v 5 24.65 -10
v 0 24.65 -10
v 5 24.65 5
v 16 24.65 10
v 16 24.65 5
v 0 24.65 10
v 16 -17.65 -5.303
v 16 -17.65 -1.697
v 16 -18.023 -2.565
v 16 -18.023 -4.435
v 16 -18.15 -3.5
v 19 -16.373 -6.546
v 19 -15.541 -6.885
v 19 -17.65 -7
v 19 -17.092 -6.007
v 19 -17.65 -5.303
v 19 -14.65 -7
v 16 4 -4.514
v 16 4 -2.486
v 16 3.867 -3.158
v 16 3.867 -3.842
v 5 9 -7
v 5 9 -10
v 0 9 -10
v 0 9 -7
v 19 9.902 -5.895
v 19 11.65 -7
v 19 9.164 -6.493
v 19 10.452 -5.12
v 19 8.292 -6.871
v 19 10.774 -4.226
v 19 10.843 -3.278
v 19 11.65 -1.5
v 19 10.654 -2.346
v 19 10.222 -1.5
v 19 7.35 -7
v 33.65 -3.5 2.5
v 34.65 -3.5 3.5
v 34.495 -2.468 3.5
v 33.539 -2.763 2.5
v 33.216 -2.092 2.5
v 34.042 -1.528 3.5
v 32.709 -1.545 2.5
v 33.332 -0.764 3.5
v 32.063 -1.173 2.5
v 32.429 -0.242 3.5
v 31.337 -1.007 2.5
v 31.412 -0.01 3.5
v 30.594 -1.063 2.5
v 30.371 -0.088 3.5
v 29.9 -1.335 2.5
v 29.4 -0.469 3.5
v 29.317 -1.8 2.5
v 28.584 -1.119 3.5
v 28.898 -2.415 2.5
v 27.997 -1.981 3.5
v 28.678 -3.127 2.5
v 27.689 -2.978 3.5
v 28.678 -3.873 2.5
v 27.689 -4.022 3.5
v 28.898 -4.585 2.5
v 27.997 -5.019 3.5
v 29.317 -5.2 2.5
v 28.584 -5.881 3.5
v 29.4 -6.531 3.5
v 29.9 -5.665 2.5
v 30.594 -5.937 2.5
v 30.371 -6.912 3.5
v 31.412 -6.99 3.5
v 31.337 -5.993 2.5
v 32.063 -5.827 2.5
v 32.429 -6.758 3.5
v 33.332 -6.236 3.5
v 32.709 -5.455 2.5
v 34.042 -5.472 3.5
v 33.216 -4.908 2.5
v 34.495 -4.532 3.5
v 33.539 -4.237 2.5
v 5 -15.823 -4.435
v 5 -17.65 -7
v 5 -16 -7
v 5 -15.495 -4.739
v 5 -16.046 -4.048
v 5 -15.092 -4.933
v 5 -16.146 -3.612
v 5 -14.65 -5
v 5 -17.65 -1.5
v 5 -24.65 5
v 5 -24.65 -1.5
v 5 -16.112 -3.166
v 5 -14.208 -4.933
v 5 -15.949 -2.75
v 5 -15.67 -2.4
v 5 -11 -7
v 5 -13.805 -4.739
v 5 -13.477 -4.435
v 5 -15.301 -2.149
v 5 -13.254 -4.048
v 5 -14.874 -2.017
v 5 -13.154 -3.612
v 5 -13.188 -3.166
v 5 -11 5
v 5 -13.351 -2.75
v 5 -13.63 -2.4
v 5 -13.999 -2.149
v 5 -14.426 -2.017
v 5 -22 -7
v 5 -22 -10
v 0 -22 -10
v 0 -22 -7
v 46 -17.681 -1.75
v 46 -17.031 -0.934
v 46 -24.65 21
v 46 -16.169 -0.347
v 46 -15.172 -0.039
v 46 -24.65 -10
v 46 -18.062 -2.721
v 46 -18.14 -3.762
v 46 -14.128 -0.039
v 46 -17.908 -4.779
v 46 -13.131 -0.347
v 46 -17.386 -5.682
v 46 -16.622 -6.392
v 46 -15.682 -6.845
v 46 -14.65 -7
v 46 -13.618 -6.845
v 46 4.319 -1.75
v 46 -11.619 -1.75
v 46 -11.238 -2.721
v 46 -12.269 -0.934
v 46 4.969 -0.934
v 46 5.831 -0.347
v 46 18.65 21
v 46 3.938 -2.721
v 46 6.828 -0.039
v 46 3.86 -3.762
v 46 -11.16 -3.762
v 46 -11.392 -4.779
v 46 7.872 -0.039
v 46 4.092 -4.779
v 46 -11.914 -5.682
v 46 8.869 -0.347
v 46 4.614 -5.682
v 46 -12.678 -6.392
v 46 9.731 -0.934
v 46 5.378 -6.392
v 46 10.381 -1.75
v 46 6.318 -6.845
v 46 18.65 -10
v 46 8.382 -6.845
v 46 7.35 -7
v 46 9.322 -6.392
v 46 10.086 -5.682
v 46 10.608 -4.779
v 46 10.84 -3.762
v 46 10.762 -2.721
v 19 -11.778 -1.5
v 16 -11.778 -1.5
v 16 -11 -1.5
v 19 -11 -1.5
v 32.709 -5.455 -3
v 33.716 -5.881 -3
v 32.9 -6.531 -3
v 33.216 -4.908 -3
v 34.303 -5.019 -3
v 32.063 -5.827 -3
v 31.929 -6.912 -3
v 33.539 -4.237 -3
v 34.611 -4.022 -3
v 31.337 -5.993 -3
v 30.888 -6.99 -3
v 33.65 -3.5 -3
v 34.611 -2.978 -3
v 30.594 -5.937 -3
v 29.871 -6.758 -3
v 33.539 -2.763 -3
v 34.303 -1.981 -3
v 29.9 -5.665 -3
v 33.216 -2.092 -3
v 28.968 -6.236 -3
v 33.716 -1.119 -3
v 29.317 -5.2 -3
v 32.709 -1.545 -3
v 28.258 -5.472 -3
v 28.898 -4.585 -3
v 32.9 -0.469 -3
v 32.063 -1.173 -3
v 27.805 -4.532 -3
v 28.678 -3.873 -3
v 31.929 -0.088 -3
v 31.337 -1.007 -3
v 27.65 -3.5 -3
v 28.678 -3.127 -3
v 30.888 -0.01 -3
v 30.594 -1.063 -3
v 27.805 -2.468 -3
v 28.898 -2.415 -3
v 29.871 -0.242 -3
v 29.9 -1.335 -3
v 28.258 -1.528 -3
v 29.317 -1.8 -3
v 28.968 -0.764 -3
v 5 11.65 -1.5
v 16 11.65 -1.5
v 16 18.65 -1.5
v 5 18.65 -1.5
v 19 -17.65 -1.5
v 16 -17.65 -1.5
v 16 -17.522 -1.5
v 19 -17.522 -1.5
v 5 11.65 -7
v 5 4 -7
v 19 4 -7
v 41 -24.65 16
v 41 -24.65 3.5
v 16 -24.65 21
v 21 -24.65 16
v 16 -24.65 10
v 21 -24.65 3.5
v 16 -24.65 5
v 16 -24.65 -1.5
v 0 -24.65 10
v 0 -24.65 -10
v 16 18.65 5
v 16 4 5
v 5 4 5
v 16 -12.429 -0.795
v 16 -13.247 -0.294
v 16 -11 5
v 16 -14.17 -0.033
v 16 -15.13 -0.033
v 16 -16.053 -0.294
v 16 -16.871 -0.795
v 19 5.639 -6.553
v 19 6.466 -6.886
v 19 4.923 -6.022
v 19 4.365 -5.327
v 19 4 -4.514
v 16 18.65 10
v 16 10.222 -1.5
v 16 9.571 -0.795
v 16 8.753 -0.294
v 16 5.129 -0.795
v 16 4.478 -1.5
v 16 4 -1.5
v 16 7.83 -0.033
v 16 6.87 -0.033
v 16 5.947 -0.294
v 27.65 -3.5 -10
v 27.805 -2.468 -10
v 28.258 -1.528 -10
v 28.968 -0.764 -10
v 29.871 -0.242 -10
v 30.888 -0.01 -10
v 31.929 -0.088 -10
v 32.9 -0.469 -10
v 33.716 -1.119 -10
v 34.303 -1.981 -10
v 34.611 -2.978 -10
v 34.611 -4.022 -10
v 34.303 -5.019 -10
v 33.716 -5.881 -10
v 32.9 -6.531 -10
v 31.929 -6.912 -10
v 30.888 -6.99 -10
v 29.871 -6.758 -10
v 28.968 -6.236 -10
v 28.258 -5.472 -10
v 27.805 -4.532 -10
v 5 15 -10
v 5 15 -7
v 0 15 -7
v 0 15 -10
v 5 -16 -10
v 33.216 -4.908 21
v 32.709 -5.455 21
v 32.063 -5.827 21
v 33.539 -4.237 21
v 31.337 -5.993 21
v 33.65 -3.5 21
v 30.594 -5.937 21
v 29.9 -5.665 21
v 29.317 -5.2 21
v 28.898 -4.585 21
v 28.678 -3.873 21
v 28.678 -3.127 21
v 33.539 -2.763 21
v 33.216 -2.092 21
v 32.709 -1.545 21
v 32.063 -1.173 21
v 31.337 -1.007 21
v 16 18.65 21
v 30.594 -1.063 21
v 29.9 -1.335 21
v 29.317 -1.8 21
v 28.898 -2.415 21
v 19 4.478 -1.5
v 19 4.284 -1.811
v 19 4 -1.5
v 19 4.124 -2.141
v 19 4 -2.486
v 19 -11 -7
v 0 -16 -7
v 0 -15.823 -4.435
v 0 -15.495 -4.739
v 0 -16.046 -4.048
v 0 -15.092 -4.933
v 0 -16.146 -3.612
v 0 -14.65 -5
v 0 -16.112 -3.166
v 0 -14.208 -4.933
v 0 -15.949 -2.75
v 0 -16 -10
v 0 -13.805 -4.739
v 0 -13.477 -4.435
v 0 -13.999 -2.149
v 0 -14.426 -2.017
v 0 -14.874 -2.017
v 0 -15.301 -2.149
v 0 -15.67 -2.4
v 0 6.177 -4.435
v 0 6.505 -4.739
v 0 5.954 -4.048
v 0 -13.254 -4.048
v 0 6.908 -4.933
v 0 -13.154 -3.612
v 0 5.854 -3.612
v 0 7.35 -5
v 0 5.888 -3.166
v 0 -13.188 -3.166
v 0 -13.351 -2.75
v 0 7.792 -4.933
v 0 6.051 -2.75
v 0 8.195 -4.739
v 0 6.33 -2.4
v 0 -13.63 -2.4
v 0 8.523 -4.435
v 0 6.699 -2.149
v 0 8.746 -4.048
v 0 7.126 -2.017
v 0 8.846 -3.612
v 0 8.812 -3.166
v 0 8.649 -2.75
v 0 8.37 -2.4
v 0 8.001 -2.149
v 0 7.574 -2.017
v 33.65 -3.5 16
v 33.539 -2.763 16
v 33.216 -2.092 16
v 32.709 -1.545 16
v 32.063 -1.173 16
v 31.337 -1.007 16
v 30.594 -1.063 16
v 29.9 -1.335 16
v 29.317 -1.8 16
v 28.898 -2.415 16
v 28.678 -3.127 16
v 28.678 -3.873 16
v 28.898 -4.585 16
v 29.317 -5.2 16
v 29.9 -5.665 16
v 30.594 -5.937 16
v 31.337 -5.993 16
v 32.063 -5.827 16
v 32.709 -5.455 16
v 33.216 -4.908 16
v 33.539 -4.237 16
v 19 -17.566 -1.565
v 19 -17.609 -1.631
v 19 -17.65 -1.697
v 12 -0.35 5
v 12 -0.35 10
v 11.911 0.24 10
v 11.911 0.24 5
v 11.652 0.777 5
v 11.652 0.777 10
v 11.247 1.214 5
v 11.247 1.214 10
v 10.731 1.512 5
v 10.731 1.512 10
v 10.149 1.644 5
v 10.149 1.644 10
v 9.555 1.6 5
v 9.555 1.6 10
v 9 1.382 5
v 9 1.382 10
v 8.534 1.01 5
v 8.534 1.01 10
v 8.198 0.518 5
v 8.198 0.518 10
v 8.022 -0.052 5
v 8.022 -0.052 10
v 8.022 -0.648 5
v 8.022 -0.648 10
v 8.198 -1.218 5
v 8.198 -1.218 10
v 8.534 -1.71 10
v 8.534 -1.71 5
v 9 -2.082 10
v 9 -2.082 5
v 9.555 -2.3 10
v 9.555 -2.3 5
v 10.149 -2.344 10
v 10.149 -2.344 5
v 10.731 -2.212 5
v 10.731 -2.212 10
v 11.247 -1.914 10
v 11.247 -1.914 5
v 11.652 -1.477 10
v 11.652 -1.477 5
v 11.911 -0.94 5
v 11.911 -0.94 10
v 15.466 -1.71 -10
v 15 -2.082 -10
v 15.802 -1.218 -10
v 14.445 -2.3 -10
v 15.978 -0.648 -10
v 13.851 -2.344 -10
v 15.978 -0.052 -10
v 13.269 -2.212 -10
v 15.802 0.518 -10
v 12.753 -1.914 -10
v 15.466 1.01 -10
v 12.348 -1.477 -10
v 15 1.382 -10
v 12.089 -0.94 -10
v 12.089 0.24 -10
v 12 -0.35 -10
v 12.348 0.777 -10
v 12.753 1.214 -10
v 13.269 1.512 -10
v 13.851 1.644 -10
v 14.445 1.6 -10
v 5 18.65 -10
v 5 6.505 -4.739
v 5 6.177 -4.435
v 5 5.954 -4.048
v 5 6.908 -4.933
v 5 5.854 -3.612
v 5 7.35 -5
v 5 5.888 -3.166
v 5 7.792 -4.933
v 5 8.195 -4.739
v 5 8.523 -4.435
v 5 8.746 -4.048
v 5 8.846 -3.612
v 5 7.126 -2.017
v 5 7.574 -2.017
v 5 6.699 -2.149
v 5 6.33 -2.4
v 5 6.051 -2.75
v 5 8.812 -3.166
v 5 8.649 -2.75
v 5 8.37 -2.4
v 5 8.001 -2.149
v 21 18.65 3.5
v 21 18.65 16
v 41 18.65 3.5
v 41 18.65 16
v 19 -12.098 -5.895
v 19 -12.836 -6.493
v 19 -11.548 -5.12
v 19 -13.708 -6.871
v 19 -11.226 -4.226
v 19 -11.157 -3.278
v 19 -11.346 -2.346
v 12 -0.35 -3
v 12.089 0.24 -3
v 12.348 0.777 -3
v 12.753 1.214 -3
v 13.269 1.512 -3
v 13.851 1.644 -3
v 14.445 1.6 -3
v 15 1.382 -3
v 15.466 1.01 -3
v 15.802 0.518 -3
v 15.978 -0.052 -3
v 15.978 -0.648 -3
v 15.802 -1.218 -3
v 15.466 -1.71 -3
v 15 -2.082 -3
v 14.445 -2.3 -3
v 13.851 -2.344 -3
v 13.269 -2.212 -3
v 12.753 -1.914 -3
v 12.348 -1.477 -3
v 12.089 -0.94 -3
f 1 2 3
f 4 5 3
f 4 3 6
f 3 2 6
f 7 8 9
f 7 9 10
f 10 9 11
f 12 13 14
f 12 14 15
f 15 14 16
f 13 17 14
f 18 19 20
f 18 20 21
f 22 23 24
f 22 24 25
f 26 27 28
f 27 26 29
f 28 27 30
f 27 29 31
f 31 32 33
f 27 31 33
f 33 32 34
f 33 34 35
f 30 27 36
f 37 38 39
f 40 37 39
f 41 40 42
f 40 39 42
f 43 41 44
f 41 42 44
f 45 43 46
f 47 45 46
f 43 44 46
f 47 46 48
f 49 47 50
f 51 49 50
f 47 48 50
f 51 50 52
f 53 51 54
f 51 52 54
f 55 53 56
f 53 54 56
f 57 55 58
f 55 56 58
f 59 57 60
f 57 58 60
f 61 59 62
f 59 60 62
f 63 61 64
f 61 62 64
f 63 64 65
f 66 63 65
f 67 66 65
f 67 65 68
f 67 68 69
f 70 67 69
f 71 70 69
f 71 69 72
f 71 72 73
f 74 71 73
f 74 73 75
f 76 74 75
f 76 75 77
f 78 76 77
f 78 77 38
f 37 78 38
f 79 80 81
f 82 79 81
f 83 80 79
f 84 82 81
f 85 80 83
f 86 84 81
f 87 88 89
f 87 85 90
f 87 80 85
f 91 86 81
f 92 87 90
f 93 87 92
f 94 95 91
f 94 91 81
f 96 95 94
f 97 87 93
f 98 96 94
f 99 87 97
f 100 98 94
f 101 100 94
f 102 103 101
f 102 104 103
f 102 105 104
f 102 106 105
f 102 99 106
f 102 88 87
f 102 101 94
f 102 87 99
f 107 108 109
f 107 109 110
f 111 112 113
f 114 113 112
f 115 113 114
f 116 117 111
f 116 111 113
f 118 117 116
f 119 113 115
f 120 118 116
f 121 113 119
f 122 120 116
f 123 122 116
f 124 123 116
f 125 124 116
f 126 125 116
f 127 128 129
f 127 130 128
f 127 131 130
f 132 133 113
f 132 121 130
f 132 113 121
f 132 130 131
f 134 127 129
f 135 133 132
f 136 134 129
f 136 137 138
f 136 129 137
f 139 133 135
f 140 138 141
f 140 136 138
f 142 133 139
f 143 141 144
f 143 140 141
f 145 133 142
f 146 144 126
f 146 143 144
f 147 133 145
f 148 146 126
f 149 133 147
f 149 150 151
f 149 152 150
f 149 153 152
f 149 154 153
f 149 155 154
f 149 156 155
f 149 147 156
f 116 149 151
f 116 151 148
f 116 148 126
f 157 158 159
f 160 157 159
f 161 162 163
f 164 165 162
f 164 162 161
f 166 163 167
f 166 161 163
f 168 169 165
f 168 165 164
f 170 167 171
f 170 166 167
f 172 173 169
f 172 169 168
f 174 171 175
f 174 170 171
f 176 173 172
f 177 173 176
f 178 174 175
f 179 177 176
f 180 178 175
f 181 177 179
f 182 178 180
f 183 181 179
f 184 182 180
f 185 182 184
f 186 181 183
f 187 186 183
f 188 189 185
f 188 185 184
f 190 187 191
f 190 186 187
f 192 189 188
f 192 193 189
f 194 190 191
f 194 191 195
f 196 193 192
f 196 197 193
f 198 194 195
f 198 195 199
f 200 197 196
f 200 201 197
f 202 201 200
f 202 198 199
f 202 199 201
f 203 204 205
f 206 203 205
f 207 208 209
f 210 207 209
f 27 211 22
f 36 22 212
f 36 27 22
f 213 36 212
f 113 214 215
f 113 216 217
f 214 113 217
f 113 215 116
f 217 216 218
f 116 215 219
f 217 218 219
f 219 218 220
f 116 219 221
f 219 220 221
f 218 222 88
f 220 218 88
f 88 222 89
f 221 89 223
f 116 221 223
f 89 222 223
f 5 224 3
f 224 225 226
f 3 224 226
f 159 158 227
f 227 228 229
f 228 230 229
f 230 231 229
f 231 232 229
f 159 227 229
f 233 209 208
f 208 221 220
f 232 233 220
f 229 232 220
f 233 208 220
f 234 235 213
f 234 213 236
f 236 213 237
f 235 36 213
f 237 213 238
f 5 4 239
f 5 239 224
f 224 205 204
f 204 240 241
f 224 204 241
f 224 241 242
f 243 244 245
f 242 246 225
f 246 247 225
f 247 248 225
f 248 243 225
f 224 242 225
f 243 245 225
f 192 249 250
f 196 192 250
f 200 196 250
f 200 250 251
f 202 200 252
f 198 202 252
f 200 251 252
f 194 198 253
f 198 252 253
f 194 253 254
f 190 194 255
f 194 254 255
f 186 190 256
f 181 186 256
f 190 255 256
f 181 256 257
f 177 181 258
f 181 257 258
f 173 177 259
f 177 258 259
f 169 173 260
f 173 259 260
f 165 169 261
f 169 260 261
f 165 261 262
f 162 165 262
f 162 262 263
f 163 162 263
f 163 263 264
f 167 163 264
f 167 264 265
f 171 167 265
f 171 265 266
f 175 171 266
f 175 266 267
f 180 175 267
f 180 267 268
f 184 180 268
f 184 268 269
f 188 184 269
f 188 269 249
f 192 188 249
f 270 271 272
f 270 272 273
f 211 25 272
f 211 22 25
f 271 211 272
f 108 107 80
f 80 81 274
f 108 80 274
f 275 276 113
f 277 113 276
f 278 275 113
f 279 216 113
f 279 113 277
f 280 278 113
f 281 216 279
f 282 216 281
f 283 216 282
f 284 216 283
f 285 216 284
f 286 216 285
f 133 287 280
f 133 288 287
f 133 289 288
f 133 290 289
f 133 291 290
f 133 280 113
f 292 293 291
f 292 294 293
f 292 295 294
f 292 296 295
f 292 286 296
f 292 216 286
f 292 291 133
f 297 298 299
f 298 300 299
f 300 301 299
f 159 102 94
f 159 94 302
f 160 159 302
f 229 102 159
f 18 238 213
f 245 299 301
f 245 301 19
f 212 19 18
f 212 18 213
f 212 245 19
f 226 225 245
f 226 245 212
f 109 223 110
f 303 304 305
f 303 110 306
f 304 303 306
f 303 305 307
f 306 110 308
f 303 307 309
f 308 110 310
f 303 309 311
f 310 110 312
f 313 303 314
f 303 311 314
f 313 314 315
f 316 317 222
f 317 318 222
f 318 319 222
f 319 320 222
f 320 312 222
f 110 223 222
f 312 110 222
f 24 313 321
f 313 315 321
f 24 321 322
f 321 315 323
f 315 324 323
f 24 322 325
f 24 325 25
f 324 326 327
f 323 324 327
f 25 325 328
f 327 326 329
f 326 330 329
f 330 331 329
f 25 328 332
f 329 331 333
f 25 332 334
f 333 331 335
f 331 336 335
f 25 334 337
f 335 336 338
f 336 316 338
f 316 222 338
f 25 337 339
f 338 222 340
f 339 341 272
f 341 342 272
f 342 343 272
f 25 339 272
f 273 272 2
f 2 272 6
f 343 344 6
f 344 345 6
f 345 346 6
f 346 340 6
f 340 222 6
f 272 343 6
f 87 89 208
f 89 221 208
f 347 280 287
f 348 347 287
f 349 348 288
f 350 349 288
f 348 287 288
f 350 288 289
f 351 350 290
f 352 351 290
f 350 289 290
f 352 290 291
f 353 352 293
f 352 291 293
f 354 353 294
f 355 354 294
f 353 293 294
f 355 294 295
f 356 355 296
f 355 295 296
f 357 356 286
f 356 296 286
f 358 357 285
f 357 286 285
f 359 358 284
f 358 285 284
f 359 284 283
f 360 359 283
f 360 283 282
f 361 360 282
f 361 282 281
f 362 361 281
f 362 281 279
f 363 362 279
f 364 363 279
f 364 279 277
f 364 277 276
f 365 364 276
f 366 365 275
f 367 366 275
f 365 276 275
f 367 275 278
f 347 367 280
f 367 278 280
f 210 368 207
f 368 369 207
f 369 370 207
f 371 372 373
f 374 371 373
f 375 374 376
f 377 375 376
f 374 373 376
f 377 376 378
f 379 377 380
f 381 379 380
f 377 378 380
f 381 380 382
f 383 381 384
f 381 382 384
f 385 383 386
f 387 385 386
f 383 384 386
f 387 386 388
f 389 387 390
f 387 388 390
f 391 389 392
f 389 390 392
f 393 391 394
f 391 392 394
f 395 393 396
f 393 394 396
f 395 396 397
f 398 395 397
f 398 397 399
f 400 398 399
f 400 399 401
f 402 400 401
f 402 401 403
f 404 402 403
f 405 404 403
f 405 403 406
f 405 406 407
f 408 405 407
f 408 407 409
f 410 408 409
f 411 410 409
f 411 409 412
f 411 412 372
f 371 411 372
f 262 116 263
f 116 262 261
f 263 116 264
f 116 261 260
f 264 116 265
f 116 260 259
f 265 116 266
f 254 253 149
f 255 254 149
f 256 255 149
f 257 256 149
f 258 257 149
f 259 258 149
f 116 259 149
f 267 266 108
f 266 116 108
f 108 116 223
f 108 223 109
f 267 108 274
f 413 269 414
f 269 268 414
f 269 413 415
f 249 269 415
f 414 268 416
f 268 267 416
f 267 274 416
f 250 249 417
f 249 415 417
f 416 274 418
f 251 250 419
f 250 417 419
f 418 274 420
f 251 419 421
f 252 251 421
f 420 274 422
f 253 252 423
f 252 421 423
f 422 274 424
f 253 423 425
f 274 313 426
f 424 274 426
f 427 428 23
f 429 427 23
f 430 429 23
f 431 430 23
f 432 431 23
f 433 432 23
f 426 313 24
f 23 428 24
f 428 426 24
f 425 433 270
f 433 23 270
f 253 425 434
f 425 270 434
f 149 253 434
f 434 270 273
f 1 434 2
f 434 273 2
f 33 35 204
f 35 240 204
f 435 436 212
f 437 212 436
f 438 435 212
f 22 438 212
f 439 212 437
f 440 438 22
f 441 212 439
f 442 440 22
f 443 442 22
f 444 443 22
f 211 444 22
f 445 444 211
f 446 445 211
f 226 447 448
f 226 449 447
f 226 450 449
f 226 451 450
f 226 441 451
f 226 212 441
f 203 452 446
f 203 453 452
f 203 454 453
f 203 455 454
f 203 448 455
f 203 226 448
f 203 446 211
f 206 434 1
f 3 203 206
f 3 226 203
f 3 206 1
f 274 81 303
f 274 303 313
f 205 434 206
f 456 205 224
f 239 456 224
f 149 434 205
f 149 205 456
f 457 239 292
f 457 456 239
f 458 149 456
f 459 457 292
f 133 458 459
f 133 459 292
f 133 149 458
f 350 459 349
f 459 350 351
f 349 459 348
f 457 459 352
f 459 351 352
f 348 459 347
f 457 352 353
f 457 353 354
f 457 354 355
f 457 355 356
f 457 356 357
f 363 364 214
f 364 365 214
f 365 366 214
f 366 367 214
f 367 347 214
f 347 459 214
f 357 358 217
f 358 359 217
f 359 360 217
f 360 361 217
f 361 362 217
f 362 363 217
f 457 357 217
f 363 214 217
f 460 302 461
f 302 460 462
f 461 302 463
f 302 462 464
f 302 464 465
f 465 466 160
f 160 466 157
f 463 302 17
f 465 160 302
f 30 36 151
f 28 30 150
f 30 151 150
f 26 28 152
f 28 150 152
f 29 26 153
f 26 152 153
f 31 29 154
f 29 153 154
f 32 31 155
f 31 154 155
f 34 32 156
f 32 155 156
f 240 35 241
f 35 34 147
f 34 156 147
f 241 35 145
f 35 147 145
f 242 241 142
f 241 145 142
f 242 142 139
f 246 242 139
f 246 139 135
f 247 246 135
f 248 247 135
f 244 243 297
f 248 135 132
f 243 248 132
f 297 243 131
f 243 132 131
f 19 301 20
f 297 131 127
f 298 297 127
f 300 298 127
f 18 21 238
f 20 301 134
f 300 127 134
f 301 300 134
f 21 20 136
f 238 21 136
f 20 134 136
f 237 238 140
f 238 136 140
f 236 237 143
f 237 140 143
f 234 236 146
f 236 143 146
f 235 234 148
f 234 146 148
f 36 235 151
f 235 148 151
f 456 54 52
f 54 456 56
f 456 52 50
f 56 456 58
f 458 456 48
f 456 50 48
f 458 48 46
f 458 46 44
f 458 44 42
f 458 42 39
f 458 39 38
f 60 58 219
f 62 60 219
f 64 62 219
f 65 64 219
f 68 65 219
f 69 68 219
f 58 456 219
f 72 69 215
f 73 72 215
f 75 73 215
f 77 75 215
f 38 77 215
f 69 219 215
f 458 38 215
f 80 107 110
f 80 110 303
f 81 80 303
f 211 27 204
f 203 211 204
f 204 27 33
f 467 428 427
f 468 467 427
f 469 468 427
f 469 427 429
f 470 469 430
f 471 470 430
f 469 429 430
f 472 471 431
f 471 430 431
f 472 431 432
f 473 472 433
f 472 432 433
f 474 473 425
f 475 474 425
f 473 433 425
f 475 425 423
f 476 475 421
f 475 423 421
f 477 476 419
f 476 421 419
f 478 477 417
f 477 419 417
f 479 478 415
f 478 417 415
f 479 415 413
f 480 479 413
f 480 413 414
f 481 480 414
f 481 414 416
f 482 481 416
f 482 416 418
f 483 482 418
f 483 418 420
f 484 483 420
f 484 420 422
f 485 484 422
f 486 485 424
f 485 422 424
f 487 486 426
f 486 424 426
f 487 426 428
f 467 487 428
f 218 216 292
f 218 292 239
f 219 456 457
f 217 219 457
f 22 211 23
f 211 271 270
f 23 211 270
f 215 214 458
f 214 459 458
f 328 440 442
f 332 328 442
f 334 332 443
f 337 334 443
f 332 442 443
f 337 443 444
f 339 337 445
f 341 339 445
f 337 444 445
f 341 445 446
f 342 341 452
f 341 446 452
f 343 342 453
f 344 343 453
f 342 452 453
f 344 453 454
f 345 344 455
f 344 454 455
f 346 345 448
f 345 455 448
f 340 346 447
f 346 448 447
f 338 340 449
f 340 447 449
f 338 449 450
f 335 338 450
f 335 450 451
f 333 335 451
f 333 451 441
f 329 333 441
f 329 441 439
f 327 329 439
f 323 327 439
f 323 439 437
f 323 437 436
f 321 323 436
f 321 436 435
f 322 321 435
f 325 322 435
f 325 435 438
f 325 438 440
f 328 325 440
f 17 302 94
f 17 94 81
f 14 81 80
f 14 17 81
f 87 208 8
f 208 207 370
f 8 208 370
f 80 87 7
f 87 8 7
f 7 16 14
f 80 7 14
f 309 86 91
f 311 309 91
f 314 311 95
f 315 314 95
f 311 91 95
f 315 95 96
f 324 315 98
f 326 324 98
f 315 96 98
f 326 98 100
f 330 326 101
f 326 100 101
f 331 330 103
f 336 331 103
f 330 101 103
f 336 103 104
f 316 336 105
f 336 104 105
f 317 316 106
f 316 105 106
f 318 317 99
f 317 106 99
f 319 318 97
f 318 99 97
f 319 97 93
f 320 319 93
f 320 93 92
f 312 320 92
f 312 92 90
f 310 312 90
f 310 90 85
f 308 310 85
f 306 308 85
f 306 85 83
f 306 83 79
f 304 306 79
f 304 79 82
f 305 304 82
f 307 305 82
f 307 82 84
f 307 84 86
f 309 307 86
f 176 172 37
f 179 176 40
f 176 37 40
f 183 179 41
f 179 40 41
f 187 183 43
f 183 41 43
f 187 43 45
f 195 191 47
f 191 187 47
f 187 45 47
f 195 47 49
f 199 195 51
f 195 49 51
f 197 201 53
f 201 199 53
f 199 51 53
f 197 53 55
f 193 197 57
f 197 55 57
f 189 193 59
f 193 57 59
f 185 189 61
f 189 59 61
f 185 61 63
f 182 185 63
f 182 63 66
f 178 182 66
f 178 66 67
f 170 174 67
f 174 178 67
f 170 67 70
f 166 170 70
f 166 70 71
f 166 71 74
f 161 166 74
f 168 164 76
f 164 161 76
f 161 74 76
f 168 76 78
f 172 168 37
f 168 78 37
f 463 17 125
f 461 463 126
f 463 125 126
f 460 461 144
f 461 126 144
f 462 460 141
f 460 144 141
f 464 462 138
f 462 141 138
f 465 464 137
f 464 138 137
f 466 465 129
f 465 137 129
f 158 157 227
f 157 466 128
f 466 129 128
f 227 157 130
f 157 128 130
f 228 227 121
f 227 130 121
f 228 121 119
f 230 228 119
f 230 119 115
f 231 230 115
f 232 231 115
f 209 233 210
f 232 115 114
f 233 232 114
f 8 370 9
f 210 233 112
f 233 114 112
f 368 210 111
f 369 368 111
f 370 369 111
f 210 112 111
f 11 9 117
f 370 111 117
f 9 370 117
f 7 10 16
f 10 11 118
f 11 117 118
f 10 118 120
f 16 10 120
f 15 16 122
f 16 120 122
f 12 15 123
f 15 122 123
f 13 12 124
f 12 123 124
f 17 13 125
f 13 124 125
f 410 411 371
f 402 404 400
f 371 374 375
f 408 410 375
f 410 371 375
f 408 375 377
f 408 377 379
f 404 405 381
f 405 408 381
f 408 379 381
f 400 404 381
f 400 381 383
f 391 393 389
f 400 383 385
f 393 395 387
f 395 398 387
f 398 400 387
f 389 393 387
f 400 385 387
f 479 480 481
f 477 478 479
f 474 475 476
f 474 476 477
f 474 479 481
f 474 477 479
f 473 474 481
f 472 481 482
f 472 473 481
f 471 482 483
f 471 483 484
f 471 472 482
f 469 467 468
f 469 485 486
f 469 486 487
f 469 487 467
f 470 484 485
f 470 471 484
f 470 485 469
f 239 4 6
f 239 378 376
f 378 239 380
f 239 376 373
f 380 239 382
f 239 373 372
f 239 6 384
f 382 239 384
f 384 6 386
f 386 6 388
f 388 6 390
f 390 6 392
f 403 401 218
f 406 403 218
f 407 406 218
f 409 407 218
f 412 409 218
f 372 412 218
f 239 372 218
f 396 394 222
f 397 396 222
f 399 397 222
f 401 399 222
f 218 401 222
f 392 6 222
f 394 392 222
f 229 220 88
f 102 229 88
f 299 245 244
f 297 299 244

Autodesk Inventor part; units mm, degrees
ref_plane "YZ Plane" through (0, 0, 0) normal (1, 0, 0) x (0, 1, 0)
ref_plane "XZ Plane" through (0, 0, 0) normal (0, 1, 0) x (-1, 0, 0)
ref_plane "XY Plane" through (0, 0, 0) normal (0, 0, 1) x (1, 0, 0)
sketch "Boceto15" plane through (0, 0, 0) normal (1, 0, 0) x (0, 1, 0)
  line L0 (24.65, 10) -> (-24.65, 10)
  line L1 (-24.65, 10) -> (-24.65, -10)
  line L2 (-24.65, -10) -> (24.65, -10)
  line L3 (24.65, -10) -> (24.65, 10)
  line L4 (0, -2.1261) -> (0, 0)
  line L5 (0, 0) -> (1.5481, 0)
  dimension "d52" = 49.3
  dimension "d53" = 20
extrude "Extrusión12" add sketch "Boceto15" along normal blind 5
sketch "Boceto16" plane through (5, 0, 0) normal (1, 0, 0) x (0, 0, -1)
  circle A0 centre (3.5, -14.65) radius 1.5
  line L0 (10, -24.65) -> (10, 24.65) projected
  line L1 (-10, -24.65) -> (10, -24.65) projected
  circle A1 centre (3.5, 7.35) radius 1.5
  point P0 (0, 0)
  dimension "d56" = 6.5
  dimension "d57" = 10
  dimension "d58" = 3
  dimension "d59" = 3
  dimension "d60" = 32
  dimension "d61" = 6.5
extrude "Extrusión13" cut sketch "Boceto16" against normal through all
sketch "Boceto17" plane through (0, -24.65, -10) normal (0, -1, 0) x (1, 0, 0)
  line L0 (5, 20) -> (5, 0) projected
  line L1 (5, 20) -> (16, 20)
  line L2 (16, 20) -> (16, 15)
  line L3 (16, 15) -> (5, 15)
  line L4 (5, 15) -> (5, 20)
  line L5 (16, 15) -> (21, 15)
  line L6 (21, 15) -> (21, 31)
  line L7 (21, 31) -> (16, 31)
  line L8 (16, 31) -> (16, 15)
  line L9 (21, 31) -> (41, 31)
  line L10 (41, 31) -> (41, 26)
  line L11 (41, 26) -> (21, 26)
  line L12 (21, 26) -> (21, 31)
  point P0 (0, 10)
  dimension "d64" = 11
  dimension "d65" = 5
  dimension "d66" = 5
  dimension "d67" = 16
  dimension "d91" = 20
  dimension "d92" = 5
extrude "Extrusión14" add sketch "Boceto17" against normal up to surface (49.3 mm away)
sketch "Boceto18" plane through (0, -24.65, 10) normal (0, 0, 1) x (1, 0, 0)
  circle A0 centre (10, 24.3) radius 2
  line L0 (0, 0) -> (16, 0) projected
  line L1 (0, 49.3) -> (0, 0) projected
  point P0 (0, 24.65)
  dimension "d70" = 24.3
  dimension "d71" = 10
  dimension "d127" = 4
extrude "Extrusión15" cut sketch "Boceto18" against normal up to surface (5 mm away)
sketch "Boceto19" plane through (5, 0, 0) normal (1, 0, 0) x (0, 0, -1)
  line L0 (10, -24.65) -> (10, 24.65) projected
  line L1 (10, -22) -> (7, -22)
  line L2 (7, -22) -> (7, -16)
  line L3 (7, -16) -> (10, -16)
  line L4 (10, -16) -> (10, -22)
  line L5 (10, 9) -> (7, 9)
  line L6 (7, 9) -> (7, 15)
  line L7 (7, 15) -> (10, 15)
  line L8 (10, 15) -> (10, 9)
  line L9 (7, 12) -> (8.4797, 12)
  line L10 (7, -19) -> (9.1788, -19)
  line L11 (-5, -24.65) -> (10, -24.65) projected
  point P0 (0, 0)
  dimension "d74" = 5.65
  dimension "d75" = 6
  dimension "d76" = 6
  dimension "d77" = 31
  dimension "d78" = 3
extrude "Extrusión16" cut sketch "Boceto19" against normal through all
sketch "Boceto20" plane through (21, -24.65, 5) normal (0, 0, -1) x (-1, 0, 0)
  line L0 (16, 49.3) -> (16, 0) projected
  line L1 (5, 0) -> (5, 49.3) projected
  line L2 (2, 0) -> (2, 49.3)
  line L3 (16, 8.65) -> (16, 33.65) projected
  line L4 (2, 28.65) -> (16, 28.65)
  line L5 (16, 28.65) -> (16, 13.65)
  line L6 (16, 13.65) -> (0, 13.65)
  line L7 (2, 13.65) -> (2, 28.65)
  line L8 (21, 33.65) -> (16, 33.65) projected
  point P0 (2, 13.65)
  dimension "d85" = 5
  dimension "d86" = 15
  dimension "d94" = 14
extrude "Extrusión17" add sketch "Boceto20" along normal up to surface (15 mm away)
sketch "Boceto21" plane through (0, -16, -10) normal (0, 0, -1) x (-1, 0, 0)
  circle A0 centre (-10, 15.65) radius 2 projected
  circle A1 centre (-14, 15.65) radius 2
  line L0 (-14, 15.65) -> (-14.5246, 15.65)
  line L1 (-10, 15.65) -> (-9.1195, 15.65)
  line L2 (-21, -8.65) -> (-21, 40.65) projected
  point P0 (0, 16)
  dimension "d87" = 4
  dimension "d106" = 7
extrude "Extrusión18" cut sketch "Boceto21" against normal blind 7 contours A1
sketch "Boceto22" plane through (0, -24.65, -10) normal (0, -1, 0) x (1, 0, 0)
  line L0 (21, 15) -> (21, 26) projected
  line L1 (21, 13.5) -> (41, 13.5)
  line L2 (41, 13.5) -> (41, 8.5)
  line L3 (41, 8.5) -> (21, 8.5)
  line L4 (21, 8.5) -> (21, 13.5)
  line L5 (21, 26) -> (41, 26) projected
  line L6 (16, 31) -> (16, 20) projected
  line L7 (21, 8.5) -> (16, 8.5)
  line L8 (16, 8.5) -> (16, 20)
  line L9 (16, 20) -> (21, 20)
  line L10 (21, 20) -> (21, 8.5)
  point P0 (0, 10)
  dimension "d95" = 5
  dimension "d96" = 12.5
extrude "Extrusión19" add sketch "Boceto22" against normal up to surface (49.3 mm away)
sketch "Boceto24" plane through (41, -24.65, 3.5) normal (1, 0, 0) x (0, 0, -1)
  line L0 (-17.5, 0) -> (-17.5, 49.3) projected
  line L1 (5, 0) -> (5, 49.3) projected
  line L2 (-17.5, 0) -> (5, 0)
  line L3 (5, 0) -> (5, 49.3)
  line L4 (5, 49.3) -> (-17.5, 49.3)
  line L5 (-17.5, 49.3) -> (-17.5, 0)
  point P0 (3.5, 24.65)
extrude "Extrusión21" add sketch "Boceto24" along normal blind 5
sketch "Boceto26" plane through (46, -24.65, 3.5) normal (1, 0, 0) x (0, 0, -1)
  line L0 (-17.5, 49.3) -> (-6.5, 49.3) projected
  line L1 (5, 28.65) -> (5, 49.3) projected
  line L2 (-17.5, 49.3) -> (5, 49.3)
  line L3 (5, 49.3) -> (5, 43.3)
  line L4 (5, 43.3) -> (-17.5, 43.3)
  line L5 (-17.5, 43.3) -> (-17.5, 49.3)
  point P0 (3.5, 24.65)
  point P1 (-6.5, 49.3)
  dimension "d111" = 6
extrude "Extrusión23" cut sketch "Boceto26" against normal up to surface (30 mm away)
sketch "Boceto25" plane through (19, -11, -10) normal (1, 0, 0) x (0, 0, -1)
  line L0 (-15, -13.65) -> (0, -13.65) projected
  line L1 (-8.5, -13.65) -> (-8.5, 0) projected
  line L2 (0, -13.65) -> (-8.5, -13.65)
  line L3 (-8.5, -13.65) -> (-8.5, -6.65)
  line L4 (-8.5, -6.65) -> (0, -6.65)
  line L5 (0, -6.65) -> (0, -13.65)
  line L6 (-8.5, 0) -> (0, 0) projected
  line L7 (0, 0) -> (-3, 0)
  line L8 (-3, 0) -> (-3, -6.65)
  line L9 (-3, -6.65) -> (0, -6.65)
  line L10 (0, -6.65) -> (0, 0)
  line L11 (-8.5, 15) -> (-8.5, 29.65) projected
  line L12 (-8.5, 29.65) -> (0, 29.65)
  line L13 (0, 29.65) -> (0, 22.65)
  line L14 (0, 22.65) -> (-8.5, 22.65)
  line L15 (-8.5, 22.65) -> (-8.5, 29.65)
  line L16 (-8.5, 15) -> (0, 15) projected
  line L17 (0, 22.65) -> (-3, 22.65)
  line L18 (-3, 22.65) -> (-3, 15)
  line L19 (-3, 15) -> (0, 15)
  line L20 (0, 15) -> (0, 22.65)
  point P0 (-10, 11)
  point P1 (0, -6.65)
  point P2 (-3, 0)
  dimension "d107" = 7
  dimension "d108" = 3
  dimension "d114" = 7
extrude "Extrusión22" add sketch "Boceto25" against normal up to surface (14 mm away) contours L1 L4 L5 L0 | L4 L8 L6 L10 | L11 L12 L13 L14 | L18 L14 L20 L16
sketch "Boceto27" plane through (0, -24.65, -10) normal (0, -1, 0) x (1, 0, 0)
  line L0 (19, 0) -> (19, 8.5) projected
  line L1 (46, 8.5) -> (46, 31) projected
  line L2 (19, 0) -> (46, 0)
  line L3 (46, 0) -> (46, 8.5)
  line L4 (46, 8.5) -> (19, 8.5)
  line L5 (19, 8.5) -> (19, 0)
  point P0 (0, 10)
extrude "Extrusión24" add sketch "Boceto27" against normal up to surface (43.3 mm away)
sketch "Boceto23" plane through (16, -24.65, 21) normal (0, 0, 1) x (1, 0, 0)
  circle A0 centre (15.15, 21.15) radius 2.5
  line L0 (0, 0) -> (0, 49.3) projected
  line L1 (25, 0) -> (0, 0) projected
  point P0 (-16, 24.65)
  dimension "d99" = 15.15
  dimension "d100" = 21.15
  dimension "d103" = 5
extrude "Extrusión20" cut sketch "Boceto23" against normal through all
sketch "Boceto28" plane through (5, 24.65, -10) normal (0, 0, -1) x (-1, 0, 0)
  circle A0 centre (-26.15, -28.15) radius 2.5 projected
  circle A1 centre (-26.15, -28.15) radius 3.5
  point P0 (5, -24.65)
  dimension "d117" = 7
extrude "Extrusión25" cut sketch "Boceto28" against normal blind 7
sketch "Boceto29" plane through (46, -24.65, 3.5) normal (1, 0, 0) x (0, 0, -1)
  circle A0 centre (7, 10) radius 1.5 projected
  circle A1 centre (7, 32) radius 1.5 projected
  circle A2 centre (7, 32) radius 3.5
  circle A3 centre (7, 10) radius 3.5
  point P0 (3.5, 24.65)
  dimension "d120" = 7
  dimension "d121" = 7
extrude "Extrusión26" cut sketch "Boceto29" against normal up to surface (30 mm away) contours A0 | A1 | A2 | A3
chamfer "Chaflán1" distance 1 angle 45 1 edges at (28.65, -3.5, 3.5)
equation "\"d59\" = d58"
equation "\"d61\" = d56"
equation "\"d76\" = d75"
properties part number "Base Idler Izq" material "Resina fenólica"
